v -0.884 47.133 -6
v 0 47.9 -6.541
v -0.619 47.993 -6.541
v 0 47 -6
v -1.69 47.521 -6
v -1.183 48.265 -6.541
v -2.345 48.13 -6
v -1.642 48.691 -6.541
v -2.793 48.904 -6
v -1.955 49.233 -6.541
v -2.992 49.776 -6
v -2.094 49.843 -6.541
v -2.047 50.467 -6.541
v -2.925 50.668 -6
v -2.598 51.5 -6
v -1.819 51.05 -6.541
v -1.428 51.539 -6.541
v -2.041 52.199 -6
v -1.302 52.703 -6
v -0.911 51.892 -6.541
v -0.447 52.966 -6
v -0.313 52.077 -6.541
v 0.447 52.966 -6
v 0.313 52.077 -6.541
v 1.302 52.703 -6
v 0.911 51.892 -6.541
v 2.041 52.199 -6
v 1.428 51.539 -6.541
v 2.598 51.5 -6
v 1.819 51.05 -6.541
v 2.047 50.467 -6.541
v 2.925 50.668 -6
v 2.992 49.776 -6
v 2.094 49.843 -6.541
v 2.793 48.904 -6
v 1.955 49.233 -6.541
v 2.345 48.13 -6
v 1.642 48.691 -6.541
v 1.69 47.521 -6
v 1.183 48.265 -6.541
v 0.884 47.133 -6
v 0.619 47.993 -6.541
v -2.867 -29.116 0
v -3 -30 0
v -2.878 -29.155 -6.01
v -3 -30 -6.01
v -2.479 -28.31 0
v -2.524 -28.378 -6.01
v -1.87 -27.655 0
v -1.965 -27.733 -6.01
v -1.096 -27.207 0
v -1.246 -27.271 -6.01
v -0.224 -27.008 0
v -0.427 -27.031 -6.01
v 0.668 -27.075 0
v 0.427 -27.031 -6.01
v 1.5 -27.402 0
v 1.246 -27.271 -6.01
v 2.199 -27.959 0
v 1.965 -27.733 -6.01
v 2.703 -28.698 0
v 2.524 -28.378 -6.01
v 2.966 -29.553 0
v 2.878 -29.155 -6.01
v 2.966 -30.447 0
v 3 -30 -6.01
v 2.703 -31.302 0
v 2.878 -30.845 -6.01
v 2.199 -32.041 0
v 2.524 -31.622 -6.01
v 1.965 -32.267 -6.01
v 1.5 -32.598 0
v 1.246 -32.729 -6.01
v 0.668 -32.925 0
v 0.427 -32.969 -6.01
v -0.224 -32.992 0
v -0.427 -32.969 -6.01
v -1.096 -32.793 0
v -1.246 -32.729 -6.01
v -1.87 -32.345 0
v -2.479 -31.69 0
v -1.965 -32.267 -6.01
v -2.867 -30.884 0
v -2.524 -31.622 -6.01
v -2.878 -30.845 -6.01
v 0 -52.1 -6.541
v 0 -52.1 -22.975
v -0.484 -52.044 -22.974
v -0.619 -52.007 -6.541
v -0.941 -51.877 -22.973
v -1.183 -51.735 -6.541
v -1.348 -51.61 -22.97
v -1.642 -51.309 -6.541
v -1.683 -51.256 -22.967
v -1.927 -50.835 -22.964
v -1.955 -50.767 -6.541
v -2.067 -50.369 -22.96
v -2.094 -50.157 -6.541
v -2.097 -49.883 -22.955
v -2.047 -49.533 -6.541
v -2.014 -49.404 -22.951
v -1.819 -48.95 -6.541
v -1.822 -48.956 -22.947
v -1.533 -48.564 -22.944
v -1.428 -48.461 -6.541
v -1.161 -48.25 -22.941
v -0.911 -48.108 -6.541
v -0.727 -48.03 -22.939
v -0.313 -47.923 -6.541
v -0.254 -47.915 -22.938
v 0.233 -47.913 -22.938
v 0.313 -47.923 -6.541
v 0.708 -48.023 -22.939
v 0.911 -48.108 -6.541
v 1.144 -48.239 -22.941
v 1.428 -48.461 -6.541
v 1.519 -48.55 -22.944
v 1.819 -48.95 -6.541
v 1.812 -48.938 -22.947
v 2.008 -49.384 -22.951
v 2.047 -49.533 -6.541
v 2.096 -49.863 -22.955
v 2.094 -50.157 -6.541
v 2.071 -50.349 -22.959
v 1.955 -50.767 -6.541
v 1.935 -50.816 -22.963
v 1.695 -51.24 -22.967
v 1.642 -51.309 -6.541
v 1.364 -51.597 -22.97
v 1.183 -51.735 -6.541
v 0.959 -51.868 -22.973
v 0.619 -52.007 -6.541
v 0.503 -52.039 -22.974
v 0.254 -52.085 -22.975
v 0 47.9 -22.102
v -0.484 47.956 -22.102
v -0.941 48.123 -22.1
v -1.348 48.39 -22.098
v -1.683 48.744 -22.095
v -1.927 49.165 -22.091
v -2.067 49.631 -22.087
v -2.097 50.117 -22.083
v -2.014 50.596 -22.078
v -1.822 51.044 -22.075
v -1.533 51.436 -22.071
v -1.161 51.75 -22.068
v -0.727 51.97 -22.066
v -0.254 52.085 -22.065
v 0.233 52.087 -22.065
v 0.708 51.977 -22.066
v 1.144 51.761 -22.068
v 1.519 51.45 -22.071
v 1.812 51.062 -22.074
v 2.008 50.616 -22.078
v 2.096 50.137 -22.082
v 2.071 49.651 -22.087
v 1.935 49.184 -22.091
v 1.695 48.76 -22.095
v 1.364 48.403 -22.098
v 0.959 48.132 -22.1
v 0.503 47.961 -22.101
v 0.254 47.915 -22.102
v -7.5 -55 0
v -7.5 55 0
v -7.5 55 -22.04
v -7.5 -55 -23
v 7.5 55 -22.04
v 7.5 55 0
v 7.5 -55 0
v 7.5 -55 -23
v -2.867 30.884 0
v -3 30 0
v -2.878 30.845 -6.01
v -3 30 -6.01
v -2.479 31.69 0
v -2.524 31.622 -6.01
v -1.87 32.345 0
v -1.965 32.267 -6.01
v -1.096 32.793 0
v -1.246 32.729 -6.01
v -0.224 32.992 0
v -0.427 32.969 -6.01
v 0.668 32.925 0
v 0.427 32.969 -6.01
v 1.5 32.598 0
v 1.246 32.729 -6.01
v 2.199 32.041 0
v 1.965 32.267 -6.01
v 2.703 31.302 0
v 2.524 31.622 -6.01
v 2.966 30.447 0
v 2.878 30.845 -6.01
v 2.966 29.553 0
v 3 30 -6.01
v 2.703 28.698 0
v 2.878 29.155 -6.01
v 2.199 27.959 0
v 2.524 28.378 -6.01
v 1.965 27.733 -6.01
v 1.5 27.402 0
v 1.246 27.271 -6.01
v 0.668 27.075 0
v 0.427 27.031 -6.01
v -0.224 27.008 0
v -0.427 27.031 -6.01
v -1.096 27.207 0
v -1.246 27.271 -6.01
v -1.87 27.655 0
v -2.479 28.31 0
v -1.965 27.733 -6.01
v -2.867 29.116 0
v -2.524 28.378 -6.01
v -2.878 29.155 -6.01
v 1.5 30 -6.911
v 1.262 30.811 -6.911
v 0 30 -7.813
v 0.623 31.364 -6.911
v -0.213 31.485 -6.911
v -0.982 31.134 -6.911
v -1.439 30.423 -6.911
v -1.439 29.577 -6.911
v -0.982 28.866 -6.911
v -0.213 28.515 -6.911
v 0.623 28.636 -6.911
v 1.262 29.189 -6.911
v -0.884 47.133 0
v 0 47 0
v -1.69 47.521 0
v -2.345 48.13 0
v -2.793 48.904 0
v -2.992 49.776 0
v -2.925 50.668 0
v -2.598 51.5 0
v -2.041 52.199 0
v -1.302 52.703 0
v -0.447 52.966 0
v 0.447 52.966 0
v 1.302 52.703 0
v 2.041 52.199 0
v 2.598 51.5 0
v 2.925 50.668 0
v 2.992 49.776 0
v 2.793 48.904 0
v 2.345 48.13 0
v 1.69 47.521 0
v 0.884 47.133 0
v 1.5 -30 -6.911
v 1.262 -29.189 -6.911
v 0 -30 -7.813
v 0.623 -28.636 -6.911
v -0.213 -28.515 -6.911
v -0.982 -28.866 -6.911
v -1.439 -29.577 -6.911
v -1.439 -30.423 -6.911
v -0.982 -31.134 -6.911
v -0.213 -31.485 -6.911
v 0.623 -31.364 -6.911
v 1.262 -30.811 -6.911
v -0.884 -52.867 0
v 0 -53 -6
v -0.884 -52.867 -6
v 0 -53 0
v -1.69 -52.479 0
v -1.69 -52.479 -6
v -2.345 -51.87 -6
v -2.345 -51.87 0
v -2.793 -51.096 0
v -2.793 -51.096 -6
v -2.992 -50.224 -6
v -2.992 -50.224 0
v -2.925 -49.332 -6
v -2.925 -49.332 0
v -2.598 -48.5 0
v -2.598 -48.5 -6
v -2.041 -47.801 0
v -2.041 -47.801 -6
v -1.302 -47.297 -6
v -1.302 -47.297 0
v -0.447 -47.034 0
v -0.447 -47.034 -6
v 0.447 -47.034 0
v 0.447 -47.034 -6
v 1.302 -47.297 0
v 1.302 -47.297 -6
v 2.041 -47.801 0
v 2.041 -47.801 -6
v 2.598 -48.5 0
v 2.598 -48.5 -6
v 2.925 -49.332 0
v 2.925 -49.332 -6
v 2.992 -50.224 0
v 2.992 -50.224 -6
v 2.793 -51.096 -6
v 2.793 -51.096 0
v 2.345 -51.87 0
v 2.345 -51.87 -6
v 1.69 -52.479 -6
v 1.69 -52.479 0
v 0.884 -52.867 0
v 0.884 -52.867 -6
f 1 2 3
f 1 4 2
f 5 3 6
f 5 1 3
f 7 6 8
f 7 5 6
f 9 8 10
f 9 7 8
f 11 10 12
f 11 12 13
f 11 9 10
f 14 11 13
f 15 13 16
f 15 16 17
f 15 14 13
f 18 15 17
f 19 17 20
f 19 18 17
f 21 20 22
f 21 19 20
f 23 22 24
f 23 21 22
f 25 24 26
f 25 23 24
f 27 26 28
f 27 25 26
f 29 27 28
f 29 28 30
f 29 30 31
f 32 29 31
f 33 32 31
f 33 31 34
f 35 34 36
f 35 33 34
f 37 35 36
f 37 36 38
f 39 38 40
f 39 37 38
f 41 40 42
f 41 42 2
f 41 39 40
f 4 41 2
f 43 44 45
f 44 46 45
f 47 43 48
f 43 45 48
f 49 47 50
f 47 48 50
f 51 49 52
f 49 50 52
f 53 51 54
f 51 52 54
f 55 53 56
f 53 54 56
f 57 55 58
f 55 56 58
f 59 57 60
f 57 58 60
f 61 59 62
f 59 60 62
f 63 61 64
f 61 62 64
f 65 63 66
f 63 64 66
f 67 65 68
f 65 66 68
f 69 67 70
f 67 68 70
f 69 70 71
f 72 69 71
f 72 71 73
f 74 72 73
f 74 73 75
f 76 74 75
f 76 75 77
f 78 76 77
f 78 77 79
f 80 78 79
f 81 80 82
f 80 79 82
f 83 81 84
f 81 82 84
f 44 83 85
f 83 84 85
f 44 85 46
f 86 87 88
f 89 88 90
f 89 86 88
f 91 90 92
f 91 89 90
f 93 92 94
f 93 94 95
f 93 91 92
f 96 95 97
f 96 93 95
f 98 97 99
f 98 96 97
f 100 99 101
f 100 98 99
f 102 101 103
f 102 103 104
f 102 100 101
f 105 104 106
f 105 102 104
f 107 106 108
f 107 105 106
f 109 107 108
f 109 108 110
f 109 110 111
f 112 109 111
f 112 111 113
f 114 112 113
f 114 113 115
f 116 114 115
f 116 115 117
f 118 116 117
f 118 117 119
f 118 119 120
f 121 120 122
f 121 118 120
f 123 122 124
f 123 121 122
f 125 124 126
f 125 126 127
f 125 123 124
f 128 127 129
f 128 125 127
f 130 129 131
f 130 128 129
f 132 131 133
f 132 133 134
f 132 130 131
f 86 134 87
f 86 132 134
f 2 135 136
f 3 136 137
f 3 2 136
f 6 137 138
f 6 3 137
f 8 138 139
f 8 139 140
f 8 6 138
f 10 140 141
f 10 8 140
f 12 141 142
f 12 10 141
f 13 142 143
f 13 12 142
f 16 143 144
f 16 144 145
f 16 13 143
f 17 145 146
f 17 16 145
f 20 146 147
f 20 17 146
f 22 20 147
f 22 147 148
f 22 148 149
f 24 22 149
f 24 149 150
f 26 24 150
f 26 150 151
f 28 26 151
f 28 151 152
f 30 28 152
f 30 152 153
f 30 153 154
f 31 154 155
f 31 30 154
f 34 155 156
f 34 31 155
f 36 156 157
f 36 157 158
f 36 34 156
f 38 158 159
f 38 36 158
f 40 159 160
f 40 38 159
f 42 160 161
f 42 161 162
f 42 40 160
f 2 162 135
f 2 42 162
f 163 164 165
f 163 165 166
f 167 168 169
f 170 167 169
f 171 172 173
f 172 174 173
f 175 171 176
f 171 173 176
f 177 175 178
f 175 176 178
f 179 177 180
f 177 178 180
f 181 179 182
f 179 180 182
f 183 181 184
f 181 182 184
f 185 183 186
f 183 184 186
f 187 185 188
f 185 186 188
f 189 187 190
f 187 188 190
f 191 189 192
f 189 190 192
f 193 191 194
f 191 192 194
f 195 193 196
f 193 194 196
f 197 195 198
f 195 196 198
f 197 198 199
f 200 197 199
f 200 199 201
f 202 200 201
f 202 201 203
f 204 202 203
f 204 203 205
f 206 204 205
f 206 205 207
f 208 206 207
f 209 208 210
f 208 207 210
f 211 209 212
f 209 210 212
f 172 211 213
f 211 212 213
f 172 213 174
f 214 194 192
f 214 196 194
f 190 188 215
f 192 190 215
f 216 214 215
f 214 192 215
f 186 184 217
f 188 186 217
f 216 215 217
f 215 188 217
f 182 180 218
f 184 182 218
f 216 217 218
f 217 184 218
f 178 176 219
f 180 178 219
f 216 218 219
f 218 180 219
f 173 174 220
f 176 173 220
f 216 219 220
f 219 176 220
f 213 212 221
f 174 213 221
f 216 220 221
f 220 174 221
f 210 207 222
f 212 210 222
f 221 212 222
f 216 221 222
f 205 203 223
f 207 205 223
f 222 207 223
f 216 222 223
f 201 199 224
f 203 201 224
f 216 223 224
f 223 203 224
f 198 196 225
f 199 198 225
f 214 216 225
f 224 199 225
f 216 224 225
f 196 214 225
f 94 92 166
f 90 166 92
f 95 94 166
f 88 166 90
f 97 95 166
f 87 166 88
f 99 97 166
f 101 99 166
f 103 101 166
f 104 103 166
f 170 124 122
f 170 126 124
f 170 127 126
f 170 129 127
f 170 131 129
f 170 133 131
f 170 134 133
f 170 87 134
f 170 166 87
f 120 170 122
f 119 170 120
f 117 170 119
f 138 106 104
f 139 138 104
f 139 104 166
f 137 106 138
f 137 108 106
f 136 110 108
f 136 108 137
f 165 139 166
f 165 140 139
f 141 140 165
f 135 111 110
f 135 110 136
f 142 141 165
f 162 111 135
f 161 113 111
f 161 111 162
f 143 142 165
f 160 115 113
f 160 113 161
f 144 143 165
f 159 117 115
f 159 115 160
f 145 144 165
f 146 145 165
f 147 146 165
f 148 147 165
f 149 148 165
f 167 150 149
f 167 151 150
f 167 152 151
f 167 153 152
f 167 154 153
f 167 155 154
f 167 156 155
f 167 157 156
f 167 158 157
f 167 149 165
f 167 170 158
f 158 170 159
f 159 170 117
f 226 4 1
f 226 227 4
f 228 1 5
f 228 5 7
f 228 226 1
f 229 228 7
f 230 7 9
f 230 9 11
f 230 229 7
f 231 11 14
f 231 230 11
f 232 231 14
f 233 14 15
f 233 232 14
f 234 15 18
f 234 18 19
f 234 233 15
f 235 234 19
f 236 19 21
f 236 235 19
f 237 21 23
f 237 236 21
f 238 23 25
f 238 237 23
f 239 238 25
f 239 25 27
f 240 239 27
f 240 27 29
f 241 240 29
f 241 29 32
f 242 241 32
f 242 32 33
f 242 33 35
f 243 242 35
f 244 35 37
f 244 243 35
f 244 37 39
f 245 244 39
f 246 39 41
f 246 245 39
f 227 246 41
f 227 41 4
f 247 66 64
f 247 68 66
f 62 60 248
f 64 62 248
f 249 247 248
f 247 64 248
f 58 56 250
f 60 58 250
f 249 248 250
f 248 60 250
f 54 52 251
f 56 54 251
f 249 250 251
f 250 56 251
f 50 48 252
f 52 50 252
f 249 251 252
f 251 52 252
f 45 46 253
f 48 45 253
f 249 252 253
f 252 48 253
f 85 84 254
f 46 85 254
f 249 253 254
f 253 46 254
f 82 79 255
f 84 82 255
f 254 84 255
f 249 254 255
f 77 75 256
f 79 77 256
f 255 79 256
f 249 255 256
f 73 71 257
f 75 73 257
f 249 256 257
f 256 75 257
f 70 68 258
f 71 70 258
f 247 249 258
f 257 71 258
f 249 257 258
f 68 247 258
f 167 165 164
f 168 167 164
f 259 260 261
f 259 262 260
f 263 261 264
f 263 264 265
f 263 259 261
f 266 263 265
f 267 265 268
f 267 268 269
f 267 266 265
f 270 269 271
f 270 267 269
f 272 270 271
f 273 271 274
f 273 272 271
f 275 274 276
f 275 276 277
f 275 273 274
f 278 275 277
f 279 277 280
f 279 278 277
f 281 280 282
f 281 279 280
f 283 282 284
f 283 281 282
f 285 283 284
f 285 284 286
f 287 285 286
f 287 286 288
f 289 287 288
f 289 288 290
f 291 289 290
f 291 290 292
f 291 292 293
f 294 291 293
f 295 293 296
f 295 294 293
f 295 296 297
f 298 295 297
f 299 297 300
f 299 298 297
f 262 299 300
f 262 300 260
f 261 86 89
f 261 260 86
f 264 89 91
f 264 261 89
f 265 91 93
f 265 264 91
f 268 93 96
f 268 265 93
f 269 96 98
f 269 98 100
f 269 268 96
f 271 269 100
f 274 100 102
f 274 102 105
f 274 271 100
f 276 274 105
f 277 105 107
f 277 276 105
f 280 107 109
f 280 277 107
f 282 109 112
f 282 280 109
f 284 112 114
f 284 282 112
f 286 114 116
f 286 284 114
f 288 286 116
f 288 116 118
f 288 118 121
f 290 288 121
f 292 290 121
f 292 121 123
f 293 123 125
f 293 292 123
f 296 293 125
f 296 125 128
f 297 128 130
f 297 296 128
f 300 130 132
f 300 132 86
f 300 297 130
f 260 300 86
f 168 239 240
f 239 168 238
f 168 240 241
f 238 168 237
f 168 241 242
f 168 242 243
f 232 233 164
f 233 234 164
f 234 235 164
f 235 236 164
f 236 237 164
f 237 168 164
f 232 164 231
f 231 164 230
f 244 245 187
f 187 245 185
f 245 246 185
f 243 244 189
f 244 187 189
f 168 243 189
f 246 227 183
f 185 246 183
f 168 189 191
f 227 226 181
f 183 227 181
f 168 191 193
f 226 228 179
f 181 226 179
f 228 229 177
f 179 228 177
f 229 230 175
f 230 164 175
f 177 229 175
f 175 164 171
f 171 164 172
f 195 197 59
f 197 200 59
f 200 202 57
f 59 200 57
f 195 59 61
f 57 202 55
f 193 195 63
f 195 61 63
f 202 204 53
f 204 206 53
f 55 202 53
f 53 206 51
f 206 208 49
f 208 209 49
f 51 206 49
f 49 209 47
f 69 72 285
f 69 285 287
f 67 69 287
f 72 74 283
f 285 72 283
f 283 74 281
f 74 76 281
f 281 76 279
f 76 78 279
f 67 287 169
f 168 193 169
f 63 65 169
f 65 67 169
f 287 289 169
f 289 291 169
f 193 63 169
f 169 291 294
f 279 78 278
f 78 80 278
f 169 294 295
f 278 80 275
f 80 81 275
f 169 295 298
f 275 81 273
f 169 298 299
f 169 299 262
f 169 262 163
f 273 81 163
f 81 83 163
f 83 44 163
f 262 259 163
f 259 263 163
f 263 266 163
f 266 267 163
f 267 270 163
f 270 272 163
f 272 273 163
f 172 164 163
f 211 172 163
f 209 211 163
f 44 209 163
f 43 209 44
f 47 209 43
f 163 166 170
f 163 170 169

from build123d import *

# Parameters (mm, degrees)
SKETCH1_W                                      = 110
SKETCH1_H                                      = 23
BOSS_EXTRUDE1_DEPTH                            = 15
F_6_0_6_DIAMETER_HOLE1_D                       = 6
F_6_0_6_DIAMETER_HOLE1_DEPTH                   = 6.01
F_6_0_6_DIAMETER_HOLE1_TIP                     = 1.802581857
CSK_FOR_M3_5_FLAT_HEAD_MACHINE_SCREW1_AT_COUNT = 2
CSK_FOR_M3_5_FLAT_HEAD_MACHINE_SCREW1_AT_PITCH = 100
CUT_EXTRUDE1_DEPTH                             = 62.473571557


with BuildPart() as part:
    # Sketch1 → Boss-Extrude1 (new body)
    with BuildSketch(Plane(origin=(-7.5, 0, 0), x_dir=(0, -1, 0), z_dir=(-1, 0, 0))):
        with Locations((0, -11.5)):
            Rectangle(SKETCH1_W, SKETCH1_H)
    extrude(amount=-BOSS_EXTRUDE1_DEPTH)

    # Ø6.0 (6) Diameter Hole1
    with Locations(Plane.XY):
        with Locations((0, 30), (0, -30)):
            Hole(F_6_0_6_DIAMETER_HOLE1_D / 2, depth=F_6_0_6_DIAMETER_HOLE1_DEPTH)
            with Locations((0, 0, -(F_6_0_6_DIAMETER_HOLE1_DEPTH + F_6_0_6_DIAMETER_HOLE1_TIP / 2))):  # 118° drill point
                Cone(0, F_6_0_6_DIAMETER_HOLE1_D / 2, F_6_0_6_DIAMETER_HOLE1_TIP, mode=Mode.SUBTRACT)

    # Sketch4 → CSK for M3.5 Flat Head Machine Screw1 (revolve, cut)
    with BuildSketch(Plane(origin=(0, 50, 0), x_dir=(0, -1, 0), z_dir=(1, 0, 0))):
        Polygon((0, 0), (0, 23), (2.1, 23), (2.1, 6.540774559), (3, 6), (3, 0), align=None)
    csk_for_m3_5_flat_head_machine_screw1 = revolve(axis=Axis((0, 50, 6.35), (0, 0, -1)), mode=Mode.SUBTRACT)

    # CSK for M3.5 Flat Head Machine Screw1 at: CSK for M3.5 Flat Head Machine Screw1 ×2
    with Locations(*[(0, -i * CSK_FOR_M3_5_FLAT_HEAD_MACHINE_SCREW1_AT_PITCH, 0) for i in range(1, CSK_FOR_M3_5_FLAT_HEAD_MACHINE_SCREW1_AT_COUNT)]):
        add(csk_for_m3_5_flat_head_machine_screw1, mode=Mode.SUBTRACT)

    # Sketch6 → Cut-Extrude1 (cut, through all)
    with BuildSketch(Plane(origin=(7.5, 0, 0), x_dir=(0, 0, -1), z_dir=(1, 0, 0))):
        Polygon((23, -55), (22.040044543, 55), (23, 55), align=None)
    extrude(amount=-CUT_EXTRUDE1_DEPTH, mode=Mode.SUBTRACT)


solid = part.part
